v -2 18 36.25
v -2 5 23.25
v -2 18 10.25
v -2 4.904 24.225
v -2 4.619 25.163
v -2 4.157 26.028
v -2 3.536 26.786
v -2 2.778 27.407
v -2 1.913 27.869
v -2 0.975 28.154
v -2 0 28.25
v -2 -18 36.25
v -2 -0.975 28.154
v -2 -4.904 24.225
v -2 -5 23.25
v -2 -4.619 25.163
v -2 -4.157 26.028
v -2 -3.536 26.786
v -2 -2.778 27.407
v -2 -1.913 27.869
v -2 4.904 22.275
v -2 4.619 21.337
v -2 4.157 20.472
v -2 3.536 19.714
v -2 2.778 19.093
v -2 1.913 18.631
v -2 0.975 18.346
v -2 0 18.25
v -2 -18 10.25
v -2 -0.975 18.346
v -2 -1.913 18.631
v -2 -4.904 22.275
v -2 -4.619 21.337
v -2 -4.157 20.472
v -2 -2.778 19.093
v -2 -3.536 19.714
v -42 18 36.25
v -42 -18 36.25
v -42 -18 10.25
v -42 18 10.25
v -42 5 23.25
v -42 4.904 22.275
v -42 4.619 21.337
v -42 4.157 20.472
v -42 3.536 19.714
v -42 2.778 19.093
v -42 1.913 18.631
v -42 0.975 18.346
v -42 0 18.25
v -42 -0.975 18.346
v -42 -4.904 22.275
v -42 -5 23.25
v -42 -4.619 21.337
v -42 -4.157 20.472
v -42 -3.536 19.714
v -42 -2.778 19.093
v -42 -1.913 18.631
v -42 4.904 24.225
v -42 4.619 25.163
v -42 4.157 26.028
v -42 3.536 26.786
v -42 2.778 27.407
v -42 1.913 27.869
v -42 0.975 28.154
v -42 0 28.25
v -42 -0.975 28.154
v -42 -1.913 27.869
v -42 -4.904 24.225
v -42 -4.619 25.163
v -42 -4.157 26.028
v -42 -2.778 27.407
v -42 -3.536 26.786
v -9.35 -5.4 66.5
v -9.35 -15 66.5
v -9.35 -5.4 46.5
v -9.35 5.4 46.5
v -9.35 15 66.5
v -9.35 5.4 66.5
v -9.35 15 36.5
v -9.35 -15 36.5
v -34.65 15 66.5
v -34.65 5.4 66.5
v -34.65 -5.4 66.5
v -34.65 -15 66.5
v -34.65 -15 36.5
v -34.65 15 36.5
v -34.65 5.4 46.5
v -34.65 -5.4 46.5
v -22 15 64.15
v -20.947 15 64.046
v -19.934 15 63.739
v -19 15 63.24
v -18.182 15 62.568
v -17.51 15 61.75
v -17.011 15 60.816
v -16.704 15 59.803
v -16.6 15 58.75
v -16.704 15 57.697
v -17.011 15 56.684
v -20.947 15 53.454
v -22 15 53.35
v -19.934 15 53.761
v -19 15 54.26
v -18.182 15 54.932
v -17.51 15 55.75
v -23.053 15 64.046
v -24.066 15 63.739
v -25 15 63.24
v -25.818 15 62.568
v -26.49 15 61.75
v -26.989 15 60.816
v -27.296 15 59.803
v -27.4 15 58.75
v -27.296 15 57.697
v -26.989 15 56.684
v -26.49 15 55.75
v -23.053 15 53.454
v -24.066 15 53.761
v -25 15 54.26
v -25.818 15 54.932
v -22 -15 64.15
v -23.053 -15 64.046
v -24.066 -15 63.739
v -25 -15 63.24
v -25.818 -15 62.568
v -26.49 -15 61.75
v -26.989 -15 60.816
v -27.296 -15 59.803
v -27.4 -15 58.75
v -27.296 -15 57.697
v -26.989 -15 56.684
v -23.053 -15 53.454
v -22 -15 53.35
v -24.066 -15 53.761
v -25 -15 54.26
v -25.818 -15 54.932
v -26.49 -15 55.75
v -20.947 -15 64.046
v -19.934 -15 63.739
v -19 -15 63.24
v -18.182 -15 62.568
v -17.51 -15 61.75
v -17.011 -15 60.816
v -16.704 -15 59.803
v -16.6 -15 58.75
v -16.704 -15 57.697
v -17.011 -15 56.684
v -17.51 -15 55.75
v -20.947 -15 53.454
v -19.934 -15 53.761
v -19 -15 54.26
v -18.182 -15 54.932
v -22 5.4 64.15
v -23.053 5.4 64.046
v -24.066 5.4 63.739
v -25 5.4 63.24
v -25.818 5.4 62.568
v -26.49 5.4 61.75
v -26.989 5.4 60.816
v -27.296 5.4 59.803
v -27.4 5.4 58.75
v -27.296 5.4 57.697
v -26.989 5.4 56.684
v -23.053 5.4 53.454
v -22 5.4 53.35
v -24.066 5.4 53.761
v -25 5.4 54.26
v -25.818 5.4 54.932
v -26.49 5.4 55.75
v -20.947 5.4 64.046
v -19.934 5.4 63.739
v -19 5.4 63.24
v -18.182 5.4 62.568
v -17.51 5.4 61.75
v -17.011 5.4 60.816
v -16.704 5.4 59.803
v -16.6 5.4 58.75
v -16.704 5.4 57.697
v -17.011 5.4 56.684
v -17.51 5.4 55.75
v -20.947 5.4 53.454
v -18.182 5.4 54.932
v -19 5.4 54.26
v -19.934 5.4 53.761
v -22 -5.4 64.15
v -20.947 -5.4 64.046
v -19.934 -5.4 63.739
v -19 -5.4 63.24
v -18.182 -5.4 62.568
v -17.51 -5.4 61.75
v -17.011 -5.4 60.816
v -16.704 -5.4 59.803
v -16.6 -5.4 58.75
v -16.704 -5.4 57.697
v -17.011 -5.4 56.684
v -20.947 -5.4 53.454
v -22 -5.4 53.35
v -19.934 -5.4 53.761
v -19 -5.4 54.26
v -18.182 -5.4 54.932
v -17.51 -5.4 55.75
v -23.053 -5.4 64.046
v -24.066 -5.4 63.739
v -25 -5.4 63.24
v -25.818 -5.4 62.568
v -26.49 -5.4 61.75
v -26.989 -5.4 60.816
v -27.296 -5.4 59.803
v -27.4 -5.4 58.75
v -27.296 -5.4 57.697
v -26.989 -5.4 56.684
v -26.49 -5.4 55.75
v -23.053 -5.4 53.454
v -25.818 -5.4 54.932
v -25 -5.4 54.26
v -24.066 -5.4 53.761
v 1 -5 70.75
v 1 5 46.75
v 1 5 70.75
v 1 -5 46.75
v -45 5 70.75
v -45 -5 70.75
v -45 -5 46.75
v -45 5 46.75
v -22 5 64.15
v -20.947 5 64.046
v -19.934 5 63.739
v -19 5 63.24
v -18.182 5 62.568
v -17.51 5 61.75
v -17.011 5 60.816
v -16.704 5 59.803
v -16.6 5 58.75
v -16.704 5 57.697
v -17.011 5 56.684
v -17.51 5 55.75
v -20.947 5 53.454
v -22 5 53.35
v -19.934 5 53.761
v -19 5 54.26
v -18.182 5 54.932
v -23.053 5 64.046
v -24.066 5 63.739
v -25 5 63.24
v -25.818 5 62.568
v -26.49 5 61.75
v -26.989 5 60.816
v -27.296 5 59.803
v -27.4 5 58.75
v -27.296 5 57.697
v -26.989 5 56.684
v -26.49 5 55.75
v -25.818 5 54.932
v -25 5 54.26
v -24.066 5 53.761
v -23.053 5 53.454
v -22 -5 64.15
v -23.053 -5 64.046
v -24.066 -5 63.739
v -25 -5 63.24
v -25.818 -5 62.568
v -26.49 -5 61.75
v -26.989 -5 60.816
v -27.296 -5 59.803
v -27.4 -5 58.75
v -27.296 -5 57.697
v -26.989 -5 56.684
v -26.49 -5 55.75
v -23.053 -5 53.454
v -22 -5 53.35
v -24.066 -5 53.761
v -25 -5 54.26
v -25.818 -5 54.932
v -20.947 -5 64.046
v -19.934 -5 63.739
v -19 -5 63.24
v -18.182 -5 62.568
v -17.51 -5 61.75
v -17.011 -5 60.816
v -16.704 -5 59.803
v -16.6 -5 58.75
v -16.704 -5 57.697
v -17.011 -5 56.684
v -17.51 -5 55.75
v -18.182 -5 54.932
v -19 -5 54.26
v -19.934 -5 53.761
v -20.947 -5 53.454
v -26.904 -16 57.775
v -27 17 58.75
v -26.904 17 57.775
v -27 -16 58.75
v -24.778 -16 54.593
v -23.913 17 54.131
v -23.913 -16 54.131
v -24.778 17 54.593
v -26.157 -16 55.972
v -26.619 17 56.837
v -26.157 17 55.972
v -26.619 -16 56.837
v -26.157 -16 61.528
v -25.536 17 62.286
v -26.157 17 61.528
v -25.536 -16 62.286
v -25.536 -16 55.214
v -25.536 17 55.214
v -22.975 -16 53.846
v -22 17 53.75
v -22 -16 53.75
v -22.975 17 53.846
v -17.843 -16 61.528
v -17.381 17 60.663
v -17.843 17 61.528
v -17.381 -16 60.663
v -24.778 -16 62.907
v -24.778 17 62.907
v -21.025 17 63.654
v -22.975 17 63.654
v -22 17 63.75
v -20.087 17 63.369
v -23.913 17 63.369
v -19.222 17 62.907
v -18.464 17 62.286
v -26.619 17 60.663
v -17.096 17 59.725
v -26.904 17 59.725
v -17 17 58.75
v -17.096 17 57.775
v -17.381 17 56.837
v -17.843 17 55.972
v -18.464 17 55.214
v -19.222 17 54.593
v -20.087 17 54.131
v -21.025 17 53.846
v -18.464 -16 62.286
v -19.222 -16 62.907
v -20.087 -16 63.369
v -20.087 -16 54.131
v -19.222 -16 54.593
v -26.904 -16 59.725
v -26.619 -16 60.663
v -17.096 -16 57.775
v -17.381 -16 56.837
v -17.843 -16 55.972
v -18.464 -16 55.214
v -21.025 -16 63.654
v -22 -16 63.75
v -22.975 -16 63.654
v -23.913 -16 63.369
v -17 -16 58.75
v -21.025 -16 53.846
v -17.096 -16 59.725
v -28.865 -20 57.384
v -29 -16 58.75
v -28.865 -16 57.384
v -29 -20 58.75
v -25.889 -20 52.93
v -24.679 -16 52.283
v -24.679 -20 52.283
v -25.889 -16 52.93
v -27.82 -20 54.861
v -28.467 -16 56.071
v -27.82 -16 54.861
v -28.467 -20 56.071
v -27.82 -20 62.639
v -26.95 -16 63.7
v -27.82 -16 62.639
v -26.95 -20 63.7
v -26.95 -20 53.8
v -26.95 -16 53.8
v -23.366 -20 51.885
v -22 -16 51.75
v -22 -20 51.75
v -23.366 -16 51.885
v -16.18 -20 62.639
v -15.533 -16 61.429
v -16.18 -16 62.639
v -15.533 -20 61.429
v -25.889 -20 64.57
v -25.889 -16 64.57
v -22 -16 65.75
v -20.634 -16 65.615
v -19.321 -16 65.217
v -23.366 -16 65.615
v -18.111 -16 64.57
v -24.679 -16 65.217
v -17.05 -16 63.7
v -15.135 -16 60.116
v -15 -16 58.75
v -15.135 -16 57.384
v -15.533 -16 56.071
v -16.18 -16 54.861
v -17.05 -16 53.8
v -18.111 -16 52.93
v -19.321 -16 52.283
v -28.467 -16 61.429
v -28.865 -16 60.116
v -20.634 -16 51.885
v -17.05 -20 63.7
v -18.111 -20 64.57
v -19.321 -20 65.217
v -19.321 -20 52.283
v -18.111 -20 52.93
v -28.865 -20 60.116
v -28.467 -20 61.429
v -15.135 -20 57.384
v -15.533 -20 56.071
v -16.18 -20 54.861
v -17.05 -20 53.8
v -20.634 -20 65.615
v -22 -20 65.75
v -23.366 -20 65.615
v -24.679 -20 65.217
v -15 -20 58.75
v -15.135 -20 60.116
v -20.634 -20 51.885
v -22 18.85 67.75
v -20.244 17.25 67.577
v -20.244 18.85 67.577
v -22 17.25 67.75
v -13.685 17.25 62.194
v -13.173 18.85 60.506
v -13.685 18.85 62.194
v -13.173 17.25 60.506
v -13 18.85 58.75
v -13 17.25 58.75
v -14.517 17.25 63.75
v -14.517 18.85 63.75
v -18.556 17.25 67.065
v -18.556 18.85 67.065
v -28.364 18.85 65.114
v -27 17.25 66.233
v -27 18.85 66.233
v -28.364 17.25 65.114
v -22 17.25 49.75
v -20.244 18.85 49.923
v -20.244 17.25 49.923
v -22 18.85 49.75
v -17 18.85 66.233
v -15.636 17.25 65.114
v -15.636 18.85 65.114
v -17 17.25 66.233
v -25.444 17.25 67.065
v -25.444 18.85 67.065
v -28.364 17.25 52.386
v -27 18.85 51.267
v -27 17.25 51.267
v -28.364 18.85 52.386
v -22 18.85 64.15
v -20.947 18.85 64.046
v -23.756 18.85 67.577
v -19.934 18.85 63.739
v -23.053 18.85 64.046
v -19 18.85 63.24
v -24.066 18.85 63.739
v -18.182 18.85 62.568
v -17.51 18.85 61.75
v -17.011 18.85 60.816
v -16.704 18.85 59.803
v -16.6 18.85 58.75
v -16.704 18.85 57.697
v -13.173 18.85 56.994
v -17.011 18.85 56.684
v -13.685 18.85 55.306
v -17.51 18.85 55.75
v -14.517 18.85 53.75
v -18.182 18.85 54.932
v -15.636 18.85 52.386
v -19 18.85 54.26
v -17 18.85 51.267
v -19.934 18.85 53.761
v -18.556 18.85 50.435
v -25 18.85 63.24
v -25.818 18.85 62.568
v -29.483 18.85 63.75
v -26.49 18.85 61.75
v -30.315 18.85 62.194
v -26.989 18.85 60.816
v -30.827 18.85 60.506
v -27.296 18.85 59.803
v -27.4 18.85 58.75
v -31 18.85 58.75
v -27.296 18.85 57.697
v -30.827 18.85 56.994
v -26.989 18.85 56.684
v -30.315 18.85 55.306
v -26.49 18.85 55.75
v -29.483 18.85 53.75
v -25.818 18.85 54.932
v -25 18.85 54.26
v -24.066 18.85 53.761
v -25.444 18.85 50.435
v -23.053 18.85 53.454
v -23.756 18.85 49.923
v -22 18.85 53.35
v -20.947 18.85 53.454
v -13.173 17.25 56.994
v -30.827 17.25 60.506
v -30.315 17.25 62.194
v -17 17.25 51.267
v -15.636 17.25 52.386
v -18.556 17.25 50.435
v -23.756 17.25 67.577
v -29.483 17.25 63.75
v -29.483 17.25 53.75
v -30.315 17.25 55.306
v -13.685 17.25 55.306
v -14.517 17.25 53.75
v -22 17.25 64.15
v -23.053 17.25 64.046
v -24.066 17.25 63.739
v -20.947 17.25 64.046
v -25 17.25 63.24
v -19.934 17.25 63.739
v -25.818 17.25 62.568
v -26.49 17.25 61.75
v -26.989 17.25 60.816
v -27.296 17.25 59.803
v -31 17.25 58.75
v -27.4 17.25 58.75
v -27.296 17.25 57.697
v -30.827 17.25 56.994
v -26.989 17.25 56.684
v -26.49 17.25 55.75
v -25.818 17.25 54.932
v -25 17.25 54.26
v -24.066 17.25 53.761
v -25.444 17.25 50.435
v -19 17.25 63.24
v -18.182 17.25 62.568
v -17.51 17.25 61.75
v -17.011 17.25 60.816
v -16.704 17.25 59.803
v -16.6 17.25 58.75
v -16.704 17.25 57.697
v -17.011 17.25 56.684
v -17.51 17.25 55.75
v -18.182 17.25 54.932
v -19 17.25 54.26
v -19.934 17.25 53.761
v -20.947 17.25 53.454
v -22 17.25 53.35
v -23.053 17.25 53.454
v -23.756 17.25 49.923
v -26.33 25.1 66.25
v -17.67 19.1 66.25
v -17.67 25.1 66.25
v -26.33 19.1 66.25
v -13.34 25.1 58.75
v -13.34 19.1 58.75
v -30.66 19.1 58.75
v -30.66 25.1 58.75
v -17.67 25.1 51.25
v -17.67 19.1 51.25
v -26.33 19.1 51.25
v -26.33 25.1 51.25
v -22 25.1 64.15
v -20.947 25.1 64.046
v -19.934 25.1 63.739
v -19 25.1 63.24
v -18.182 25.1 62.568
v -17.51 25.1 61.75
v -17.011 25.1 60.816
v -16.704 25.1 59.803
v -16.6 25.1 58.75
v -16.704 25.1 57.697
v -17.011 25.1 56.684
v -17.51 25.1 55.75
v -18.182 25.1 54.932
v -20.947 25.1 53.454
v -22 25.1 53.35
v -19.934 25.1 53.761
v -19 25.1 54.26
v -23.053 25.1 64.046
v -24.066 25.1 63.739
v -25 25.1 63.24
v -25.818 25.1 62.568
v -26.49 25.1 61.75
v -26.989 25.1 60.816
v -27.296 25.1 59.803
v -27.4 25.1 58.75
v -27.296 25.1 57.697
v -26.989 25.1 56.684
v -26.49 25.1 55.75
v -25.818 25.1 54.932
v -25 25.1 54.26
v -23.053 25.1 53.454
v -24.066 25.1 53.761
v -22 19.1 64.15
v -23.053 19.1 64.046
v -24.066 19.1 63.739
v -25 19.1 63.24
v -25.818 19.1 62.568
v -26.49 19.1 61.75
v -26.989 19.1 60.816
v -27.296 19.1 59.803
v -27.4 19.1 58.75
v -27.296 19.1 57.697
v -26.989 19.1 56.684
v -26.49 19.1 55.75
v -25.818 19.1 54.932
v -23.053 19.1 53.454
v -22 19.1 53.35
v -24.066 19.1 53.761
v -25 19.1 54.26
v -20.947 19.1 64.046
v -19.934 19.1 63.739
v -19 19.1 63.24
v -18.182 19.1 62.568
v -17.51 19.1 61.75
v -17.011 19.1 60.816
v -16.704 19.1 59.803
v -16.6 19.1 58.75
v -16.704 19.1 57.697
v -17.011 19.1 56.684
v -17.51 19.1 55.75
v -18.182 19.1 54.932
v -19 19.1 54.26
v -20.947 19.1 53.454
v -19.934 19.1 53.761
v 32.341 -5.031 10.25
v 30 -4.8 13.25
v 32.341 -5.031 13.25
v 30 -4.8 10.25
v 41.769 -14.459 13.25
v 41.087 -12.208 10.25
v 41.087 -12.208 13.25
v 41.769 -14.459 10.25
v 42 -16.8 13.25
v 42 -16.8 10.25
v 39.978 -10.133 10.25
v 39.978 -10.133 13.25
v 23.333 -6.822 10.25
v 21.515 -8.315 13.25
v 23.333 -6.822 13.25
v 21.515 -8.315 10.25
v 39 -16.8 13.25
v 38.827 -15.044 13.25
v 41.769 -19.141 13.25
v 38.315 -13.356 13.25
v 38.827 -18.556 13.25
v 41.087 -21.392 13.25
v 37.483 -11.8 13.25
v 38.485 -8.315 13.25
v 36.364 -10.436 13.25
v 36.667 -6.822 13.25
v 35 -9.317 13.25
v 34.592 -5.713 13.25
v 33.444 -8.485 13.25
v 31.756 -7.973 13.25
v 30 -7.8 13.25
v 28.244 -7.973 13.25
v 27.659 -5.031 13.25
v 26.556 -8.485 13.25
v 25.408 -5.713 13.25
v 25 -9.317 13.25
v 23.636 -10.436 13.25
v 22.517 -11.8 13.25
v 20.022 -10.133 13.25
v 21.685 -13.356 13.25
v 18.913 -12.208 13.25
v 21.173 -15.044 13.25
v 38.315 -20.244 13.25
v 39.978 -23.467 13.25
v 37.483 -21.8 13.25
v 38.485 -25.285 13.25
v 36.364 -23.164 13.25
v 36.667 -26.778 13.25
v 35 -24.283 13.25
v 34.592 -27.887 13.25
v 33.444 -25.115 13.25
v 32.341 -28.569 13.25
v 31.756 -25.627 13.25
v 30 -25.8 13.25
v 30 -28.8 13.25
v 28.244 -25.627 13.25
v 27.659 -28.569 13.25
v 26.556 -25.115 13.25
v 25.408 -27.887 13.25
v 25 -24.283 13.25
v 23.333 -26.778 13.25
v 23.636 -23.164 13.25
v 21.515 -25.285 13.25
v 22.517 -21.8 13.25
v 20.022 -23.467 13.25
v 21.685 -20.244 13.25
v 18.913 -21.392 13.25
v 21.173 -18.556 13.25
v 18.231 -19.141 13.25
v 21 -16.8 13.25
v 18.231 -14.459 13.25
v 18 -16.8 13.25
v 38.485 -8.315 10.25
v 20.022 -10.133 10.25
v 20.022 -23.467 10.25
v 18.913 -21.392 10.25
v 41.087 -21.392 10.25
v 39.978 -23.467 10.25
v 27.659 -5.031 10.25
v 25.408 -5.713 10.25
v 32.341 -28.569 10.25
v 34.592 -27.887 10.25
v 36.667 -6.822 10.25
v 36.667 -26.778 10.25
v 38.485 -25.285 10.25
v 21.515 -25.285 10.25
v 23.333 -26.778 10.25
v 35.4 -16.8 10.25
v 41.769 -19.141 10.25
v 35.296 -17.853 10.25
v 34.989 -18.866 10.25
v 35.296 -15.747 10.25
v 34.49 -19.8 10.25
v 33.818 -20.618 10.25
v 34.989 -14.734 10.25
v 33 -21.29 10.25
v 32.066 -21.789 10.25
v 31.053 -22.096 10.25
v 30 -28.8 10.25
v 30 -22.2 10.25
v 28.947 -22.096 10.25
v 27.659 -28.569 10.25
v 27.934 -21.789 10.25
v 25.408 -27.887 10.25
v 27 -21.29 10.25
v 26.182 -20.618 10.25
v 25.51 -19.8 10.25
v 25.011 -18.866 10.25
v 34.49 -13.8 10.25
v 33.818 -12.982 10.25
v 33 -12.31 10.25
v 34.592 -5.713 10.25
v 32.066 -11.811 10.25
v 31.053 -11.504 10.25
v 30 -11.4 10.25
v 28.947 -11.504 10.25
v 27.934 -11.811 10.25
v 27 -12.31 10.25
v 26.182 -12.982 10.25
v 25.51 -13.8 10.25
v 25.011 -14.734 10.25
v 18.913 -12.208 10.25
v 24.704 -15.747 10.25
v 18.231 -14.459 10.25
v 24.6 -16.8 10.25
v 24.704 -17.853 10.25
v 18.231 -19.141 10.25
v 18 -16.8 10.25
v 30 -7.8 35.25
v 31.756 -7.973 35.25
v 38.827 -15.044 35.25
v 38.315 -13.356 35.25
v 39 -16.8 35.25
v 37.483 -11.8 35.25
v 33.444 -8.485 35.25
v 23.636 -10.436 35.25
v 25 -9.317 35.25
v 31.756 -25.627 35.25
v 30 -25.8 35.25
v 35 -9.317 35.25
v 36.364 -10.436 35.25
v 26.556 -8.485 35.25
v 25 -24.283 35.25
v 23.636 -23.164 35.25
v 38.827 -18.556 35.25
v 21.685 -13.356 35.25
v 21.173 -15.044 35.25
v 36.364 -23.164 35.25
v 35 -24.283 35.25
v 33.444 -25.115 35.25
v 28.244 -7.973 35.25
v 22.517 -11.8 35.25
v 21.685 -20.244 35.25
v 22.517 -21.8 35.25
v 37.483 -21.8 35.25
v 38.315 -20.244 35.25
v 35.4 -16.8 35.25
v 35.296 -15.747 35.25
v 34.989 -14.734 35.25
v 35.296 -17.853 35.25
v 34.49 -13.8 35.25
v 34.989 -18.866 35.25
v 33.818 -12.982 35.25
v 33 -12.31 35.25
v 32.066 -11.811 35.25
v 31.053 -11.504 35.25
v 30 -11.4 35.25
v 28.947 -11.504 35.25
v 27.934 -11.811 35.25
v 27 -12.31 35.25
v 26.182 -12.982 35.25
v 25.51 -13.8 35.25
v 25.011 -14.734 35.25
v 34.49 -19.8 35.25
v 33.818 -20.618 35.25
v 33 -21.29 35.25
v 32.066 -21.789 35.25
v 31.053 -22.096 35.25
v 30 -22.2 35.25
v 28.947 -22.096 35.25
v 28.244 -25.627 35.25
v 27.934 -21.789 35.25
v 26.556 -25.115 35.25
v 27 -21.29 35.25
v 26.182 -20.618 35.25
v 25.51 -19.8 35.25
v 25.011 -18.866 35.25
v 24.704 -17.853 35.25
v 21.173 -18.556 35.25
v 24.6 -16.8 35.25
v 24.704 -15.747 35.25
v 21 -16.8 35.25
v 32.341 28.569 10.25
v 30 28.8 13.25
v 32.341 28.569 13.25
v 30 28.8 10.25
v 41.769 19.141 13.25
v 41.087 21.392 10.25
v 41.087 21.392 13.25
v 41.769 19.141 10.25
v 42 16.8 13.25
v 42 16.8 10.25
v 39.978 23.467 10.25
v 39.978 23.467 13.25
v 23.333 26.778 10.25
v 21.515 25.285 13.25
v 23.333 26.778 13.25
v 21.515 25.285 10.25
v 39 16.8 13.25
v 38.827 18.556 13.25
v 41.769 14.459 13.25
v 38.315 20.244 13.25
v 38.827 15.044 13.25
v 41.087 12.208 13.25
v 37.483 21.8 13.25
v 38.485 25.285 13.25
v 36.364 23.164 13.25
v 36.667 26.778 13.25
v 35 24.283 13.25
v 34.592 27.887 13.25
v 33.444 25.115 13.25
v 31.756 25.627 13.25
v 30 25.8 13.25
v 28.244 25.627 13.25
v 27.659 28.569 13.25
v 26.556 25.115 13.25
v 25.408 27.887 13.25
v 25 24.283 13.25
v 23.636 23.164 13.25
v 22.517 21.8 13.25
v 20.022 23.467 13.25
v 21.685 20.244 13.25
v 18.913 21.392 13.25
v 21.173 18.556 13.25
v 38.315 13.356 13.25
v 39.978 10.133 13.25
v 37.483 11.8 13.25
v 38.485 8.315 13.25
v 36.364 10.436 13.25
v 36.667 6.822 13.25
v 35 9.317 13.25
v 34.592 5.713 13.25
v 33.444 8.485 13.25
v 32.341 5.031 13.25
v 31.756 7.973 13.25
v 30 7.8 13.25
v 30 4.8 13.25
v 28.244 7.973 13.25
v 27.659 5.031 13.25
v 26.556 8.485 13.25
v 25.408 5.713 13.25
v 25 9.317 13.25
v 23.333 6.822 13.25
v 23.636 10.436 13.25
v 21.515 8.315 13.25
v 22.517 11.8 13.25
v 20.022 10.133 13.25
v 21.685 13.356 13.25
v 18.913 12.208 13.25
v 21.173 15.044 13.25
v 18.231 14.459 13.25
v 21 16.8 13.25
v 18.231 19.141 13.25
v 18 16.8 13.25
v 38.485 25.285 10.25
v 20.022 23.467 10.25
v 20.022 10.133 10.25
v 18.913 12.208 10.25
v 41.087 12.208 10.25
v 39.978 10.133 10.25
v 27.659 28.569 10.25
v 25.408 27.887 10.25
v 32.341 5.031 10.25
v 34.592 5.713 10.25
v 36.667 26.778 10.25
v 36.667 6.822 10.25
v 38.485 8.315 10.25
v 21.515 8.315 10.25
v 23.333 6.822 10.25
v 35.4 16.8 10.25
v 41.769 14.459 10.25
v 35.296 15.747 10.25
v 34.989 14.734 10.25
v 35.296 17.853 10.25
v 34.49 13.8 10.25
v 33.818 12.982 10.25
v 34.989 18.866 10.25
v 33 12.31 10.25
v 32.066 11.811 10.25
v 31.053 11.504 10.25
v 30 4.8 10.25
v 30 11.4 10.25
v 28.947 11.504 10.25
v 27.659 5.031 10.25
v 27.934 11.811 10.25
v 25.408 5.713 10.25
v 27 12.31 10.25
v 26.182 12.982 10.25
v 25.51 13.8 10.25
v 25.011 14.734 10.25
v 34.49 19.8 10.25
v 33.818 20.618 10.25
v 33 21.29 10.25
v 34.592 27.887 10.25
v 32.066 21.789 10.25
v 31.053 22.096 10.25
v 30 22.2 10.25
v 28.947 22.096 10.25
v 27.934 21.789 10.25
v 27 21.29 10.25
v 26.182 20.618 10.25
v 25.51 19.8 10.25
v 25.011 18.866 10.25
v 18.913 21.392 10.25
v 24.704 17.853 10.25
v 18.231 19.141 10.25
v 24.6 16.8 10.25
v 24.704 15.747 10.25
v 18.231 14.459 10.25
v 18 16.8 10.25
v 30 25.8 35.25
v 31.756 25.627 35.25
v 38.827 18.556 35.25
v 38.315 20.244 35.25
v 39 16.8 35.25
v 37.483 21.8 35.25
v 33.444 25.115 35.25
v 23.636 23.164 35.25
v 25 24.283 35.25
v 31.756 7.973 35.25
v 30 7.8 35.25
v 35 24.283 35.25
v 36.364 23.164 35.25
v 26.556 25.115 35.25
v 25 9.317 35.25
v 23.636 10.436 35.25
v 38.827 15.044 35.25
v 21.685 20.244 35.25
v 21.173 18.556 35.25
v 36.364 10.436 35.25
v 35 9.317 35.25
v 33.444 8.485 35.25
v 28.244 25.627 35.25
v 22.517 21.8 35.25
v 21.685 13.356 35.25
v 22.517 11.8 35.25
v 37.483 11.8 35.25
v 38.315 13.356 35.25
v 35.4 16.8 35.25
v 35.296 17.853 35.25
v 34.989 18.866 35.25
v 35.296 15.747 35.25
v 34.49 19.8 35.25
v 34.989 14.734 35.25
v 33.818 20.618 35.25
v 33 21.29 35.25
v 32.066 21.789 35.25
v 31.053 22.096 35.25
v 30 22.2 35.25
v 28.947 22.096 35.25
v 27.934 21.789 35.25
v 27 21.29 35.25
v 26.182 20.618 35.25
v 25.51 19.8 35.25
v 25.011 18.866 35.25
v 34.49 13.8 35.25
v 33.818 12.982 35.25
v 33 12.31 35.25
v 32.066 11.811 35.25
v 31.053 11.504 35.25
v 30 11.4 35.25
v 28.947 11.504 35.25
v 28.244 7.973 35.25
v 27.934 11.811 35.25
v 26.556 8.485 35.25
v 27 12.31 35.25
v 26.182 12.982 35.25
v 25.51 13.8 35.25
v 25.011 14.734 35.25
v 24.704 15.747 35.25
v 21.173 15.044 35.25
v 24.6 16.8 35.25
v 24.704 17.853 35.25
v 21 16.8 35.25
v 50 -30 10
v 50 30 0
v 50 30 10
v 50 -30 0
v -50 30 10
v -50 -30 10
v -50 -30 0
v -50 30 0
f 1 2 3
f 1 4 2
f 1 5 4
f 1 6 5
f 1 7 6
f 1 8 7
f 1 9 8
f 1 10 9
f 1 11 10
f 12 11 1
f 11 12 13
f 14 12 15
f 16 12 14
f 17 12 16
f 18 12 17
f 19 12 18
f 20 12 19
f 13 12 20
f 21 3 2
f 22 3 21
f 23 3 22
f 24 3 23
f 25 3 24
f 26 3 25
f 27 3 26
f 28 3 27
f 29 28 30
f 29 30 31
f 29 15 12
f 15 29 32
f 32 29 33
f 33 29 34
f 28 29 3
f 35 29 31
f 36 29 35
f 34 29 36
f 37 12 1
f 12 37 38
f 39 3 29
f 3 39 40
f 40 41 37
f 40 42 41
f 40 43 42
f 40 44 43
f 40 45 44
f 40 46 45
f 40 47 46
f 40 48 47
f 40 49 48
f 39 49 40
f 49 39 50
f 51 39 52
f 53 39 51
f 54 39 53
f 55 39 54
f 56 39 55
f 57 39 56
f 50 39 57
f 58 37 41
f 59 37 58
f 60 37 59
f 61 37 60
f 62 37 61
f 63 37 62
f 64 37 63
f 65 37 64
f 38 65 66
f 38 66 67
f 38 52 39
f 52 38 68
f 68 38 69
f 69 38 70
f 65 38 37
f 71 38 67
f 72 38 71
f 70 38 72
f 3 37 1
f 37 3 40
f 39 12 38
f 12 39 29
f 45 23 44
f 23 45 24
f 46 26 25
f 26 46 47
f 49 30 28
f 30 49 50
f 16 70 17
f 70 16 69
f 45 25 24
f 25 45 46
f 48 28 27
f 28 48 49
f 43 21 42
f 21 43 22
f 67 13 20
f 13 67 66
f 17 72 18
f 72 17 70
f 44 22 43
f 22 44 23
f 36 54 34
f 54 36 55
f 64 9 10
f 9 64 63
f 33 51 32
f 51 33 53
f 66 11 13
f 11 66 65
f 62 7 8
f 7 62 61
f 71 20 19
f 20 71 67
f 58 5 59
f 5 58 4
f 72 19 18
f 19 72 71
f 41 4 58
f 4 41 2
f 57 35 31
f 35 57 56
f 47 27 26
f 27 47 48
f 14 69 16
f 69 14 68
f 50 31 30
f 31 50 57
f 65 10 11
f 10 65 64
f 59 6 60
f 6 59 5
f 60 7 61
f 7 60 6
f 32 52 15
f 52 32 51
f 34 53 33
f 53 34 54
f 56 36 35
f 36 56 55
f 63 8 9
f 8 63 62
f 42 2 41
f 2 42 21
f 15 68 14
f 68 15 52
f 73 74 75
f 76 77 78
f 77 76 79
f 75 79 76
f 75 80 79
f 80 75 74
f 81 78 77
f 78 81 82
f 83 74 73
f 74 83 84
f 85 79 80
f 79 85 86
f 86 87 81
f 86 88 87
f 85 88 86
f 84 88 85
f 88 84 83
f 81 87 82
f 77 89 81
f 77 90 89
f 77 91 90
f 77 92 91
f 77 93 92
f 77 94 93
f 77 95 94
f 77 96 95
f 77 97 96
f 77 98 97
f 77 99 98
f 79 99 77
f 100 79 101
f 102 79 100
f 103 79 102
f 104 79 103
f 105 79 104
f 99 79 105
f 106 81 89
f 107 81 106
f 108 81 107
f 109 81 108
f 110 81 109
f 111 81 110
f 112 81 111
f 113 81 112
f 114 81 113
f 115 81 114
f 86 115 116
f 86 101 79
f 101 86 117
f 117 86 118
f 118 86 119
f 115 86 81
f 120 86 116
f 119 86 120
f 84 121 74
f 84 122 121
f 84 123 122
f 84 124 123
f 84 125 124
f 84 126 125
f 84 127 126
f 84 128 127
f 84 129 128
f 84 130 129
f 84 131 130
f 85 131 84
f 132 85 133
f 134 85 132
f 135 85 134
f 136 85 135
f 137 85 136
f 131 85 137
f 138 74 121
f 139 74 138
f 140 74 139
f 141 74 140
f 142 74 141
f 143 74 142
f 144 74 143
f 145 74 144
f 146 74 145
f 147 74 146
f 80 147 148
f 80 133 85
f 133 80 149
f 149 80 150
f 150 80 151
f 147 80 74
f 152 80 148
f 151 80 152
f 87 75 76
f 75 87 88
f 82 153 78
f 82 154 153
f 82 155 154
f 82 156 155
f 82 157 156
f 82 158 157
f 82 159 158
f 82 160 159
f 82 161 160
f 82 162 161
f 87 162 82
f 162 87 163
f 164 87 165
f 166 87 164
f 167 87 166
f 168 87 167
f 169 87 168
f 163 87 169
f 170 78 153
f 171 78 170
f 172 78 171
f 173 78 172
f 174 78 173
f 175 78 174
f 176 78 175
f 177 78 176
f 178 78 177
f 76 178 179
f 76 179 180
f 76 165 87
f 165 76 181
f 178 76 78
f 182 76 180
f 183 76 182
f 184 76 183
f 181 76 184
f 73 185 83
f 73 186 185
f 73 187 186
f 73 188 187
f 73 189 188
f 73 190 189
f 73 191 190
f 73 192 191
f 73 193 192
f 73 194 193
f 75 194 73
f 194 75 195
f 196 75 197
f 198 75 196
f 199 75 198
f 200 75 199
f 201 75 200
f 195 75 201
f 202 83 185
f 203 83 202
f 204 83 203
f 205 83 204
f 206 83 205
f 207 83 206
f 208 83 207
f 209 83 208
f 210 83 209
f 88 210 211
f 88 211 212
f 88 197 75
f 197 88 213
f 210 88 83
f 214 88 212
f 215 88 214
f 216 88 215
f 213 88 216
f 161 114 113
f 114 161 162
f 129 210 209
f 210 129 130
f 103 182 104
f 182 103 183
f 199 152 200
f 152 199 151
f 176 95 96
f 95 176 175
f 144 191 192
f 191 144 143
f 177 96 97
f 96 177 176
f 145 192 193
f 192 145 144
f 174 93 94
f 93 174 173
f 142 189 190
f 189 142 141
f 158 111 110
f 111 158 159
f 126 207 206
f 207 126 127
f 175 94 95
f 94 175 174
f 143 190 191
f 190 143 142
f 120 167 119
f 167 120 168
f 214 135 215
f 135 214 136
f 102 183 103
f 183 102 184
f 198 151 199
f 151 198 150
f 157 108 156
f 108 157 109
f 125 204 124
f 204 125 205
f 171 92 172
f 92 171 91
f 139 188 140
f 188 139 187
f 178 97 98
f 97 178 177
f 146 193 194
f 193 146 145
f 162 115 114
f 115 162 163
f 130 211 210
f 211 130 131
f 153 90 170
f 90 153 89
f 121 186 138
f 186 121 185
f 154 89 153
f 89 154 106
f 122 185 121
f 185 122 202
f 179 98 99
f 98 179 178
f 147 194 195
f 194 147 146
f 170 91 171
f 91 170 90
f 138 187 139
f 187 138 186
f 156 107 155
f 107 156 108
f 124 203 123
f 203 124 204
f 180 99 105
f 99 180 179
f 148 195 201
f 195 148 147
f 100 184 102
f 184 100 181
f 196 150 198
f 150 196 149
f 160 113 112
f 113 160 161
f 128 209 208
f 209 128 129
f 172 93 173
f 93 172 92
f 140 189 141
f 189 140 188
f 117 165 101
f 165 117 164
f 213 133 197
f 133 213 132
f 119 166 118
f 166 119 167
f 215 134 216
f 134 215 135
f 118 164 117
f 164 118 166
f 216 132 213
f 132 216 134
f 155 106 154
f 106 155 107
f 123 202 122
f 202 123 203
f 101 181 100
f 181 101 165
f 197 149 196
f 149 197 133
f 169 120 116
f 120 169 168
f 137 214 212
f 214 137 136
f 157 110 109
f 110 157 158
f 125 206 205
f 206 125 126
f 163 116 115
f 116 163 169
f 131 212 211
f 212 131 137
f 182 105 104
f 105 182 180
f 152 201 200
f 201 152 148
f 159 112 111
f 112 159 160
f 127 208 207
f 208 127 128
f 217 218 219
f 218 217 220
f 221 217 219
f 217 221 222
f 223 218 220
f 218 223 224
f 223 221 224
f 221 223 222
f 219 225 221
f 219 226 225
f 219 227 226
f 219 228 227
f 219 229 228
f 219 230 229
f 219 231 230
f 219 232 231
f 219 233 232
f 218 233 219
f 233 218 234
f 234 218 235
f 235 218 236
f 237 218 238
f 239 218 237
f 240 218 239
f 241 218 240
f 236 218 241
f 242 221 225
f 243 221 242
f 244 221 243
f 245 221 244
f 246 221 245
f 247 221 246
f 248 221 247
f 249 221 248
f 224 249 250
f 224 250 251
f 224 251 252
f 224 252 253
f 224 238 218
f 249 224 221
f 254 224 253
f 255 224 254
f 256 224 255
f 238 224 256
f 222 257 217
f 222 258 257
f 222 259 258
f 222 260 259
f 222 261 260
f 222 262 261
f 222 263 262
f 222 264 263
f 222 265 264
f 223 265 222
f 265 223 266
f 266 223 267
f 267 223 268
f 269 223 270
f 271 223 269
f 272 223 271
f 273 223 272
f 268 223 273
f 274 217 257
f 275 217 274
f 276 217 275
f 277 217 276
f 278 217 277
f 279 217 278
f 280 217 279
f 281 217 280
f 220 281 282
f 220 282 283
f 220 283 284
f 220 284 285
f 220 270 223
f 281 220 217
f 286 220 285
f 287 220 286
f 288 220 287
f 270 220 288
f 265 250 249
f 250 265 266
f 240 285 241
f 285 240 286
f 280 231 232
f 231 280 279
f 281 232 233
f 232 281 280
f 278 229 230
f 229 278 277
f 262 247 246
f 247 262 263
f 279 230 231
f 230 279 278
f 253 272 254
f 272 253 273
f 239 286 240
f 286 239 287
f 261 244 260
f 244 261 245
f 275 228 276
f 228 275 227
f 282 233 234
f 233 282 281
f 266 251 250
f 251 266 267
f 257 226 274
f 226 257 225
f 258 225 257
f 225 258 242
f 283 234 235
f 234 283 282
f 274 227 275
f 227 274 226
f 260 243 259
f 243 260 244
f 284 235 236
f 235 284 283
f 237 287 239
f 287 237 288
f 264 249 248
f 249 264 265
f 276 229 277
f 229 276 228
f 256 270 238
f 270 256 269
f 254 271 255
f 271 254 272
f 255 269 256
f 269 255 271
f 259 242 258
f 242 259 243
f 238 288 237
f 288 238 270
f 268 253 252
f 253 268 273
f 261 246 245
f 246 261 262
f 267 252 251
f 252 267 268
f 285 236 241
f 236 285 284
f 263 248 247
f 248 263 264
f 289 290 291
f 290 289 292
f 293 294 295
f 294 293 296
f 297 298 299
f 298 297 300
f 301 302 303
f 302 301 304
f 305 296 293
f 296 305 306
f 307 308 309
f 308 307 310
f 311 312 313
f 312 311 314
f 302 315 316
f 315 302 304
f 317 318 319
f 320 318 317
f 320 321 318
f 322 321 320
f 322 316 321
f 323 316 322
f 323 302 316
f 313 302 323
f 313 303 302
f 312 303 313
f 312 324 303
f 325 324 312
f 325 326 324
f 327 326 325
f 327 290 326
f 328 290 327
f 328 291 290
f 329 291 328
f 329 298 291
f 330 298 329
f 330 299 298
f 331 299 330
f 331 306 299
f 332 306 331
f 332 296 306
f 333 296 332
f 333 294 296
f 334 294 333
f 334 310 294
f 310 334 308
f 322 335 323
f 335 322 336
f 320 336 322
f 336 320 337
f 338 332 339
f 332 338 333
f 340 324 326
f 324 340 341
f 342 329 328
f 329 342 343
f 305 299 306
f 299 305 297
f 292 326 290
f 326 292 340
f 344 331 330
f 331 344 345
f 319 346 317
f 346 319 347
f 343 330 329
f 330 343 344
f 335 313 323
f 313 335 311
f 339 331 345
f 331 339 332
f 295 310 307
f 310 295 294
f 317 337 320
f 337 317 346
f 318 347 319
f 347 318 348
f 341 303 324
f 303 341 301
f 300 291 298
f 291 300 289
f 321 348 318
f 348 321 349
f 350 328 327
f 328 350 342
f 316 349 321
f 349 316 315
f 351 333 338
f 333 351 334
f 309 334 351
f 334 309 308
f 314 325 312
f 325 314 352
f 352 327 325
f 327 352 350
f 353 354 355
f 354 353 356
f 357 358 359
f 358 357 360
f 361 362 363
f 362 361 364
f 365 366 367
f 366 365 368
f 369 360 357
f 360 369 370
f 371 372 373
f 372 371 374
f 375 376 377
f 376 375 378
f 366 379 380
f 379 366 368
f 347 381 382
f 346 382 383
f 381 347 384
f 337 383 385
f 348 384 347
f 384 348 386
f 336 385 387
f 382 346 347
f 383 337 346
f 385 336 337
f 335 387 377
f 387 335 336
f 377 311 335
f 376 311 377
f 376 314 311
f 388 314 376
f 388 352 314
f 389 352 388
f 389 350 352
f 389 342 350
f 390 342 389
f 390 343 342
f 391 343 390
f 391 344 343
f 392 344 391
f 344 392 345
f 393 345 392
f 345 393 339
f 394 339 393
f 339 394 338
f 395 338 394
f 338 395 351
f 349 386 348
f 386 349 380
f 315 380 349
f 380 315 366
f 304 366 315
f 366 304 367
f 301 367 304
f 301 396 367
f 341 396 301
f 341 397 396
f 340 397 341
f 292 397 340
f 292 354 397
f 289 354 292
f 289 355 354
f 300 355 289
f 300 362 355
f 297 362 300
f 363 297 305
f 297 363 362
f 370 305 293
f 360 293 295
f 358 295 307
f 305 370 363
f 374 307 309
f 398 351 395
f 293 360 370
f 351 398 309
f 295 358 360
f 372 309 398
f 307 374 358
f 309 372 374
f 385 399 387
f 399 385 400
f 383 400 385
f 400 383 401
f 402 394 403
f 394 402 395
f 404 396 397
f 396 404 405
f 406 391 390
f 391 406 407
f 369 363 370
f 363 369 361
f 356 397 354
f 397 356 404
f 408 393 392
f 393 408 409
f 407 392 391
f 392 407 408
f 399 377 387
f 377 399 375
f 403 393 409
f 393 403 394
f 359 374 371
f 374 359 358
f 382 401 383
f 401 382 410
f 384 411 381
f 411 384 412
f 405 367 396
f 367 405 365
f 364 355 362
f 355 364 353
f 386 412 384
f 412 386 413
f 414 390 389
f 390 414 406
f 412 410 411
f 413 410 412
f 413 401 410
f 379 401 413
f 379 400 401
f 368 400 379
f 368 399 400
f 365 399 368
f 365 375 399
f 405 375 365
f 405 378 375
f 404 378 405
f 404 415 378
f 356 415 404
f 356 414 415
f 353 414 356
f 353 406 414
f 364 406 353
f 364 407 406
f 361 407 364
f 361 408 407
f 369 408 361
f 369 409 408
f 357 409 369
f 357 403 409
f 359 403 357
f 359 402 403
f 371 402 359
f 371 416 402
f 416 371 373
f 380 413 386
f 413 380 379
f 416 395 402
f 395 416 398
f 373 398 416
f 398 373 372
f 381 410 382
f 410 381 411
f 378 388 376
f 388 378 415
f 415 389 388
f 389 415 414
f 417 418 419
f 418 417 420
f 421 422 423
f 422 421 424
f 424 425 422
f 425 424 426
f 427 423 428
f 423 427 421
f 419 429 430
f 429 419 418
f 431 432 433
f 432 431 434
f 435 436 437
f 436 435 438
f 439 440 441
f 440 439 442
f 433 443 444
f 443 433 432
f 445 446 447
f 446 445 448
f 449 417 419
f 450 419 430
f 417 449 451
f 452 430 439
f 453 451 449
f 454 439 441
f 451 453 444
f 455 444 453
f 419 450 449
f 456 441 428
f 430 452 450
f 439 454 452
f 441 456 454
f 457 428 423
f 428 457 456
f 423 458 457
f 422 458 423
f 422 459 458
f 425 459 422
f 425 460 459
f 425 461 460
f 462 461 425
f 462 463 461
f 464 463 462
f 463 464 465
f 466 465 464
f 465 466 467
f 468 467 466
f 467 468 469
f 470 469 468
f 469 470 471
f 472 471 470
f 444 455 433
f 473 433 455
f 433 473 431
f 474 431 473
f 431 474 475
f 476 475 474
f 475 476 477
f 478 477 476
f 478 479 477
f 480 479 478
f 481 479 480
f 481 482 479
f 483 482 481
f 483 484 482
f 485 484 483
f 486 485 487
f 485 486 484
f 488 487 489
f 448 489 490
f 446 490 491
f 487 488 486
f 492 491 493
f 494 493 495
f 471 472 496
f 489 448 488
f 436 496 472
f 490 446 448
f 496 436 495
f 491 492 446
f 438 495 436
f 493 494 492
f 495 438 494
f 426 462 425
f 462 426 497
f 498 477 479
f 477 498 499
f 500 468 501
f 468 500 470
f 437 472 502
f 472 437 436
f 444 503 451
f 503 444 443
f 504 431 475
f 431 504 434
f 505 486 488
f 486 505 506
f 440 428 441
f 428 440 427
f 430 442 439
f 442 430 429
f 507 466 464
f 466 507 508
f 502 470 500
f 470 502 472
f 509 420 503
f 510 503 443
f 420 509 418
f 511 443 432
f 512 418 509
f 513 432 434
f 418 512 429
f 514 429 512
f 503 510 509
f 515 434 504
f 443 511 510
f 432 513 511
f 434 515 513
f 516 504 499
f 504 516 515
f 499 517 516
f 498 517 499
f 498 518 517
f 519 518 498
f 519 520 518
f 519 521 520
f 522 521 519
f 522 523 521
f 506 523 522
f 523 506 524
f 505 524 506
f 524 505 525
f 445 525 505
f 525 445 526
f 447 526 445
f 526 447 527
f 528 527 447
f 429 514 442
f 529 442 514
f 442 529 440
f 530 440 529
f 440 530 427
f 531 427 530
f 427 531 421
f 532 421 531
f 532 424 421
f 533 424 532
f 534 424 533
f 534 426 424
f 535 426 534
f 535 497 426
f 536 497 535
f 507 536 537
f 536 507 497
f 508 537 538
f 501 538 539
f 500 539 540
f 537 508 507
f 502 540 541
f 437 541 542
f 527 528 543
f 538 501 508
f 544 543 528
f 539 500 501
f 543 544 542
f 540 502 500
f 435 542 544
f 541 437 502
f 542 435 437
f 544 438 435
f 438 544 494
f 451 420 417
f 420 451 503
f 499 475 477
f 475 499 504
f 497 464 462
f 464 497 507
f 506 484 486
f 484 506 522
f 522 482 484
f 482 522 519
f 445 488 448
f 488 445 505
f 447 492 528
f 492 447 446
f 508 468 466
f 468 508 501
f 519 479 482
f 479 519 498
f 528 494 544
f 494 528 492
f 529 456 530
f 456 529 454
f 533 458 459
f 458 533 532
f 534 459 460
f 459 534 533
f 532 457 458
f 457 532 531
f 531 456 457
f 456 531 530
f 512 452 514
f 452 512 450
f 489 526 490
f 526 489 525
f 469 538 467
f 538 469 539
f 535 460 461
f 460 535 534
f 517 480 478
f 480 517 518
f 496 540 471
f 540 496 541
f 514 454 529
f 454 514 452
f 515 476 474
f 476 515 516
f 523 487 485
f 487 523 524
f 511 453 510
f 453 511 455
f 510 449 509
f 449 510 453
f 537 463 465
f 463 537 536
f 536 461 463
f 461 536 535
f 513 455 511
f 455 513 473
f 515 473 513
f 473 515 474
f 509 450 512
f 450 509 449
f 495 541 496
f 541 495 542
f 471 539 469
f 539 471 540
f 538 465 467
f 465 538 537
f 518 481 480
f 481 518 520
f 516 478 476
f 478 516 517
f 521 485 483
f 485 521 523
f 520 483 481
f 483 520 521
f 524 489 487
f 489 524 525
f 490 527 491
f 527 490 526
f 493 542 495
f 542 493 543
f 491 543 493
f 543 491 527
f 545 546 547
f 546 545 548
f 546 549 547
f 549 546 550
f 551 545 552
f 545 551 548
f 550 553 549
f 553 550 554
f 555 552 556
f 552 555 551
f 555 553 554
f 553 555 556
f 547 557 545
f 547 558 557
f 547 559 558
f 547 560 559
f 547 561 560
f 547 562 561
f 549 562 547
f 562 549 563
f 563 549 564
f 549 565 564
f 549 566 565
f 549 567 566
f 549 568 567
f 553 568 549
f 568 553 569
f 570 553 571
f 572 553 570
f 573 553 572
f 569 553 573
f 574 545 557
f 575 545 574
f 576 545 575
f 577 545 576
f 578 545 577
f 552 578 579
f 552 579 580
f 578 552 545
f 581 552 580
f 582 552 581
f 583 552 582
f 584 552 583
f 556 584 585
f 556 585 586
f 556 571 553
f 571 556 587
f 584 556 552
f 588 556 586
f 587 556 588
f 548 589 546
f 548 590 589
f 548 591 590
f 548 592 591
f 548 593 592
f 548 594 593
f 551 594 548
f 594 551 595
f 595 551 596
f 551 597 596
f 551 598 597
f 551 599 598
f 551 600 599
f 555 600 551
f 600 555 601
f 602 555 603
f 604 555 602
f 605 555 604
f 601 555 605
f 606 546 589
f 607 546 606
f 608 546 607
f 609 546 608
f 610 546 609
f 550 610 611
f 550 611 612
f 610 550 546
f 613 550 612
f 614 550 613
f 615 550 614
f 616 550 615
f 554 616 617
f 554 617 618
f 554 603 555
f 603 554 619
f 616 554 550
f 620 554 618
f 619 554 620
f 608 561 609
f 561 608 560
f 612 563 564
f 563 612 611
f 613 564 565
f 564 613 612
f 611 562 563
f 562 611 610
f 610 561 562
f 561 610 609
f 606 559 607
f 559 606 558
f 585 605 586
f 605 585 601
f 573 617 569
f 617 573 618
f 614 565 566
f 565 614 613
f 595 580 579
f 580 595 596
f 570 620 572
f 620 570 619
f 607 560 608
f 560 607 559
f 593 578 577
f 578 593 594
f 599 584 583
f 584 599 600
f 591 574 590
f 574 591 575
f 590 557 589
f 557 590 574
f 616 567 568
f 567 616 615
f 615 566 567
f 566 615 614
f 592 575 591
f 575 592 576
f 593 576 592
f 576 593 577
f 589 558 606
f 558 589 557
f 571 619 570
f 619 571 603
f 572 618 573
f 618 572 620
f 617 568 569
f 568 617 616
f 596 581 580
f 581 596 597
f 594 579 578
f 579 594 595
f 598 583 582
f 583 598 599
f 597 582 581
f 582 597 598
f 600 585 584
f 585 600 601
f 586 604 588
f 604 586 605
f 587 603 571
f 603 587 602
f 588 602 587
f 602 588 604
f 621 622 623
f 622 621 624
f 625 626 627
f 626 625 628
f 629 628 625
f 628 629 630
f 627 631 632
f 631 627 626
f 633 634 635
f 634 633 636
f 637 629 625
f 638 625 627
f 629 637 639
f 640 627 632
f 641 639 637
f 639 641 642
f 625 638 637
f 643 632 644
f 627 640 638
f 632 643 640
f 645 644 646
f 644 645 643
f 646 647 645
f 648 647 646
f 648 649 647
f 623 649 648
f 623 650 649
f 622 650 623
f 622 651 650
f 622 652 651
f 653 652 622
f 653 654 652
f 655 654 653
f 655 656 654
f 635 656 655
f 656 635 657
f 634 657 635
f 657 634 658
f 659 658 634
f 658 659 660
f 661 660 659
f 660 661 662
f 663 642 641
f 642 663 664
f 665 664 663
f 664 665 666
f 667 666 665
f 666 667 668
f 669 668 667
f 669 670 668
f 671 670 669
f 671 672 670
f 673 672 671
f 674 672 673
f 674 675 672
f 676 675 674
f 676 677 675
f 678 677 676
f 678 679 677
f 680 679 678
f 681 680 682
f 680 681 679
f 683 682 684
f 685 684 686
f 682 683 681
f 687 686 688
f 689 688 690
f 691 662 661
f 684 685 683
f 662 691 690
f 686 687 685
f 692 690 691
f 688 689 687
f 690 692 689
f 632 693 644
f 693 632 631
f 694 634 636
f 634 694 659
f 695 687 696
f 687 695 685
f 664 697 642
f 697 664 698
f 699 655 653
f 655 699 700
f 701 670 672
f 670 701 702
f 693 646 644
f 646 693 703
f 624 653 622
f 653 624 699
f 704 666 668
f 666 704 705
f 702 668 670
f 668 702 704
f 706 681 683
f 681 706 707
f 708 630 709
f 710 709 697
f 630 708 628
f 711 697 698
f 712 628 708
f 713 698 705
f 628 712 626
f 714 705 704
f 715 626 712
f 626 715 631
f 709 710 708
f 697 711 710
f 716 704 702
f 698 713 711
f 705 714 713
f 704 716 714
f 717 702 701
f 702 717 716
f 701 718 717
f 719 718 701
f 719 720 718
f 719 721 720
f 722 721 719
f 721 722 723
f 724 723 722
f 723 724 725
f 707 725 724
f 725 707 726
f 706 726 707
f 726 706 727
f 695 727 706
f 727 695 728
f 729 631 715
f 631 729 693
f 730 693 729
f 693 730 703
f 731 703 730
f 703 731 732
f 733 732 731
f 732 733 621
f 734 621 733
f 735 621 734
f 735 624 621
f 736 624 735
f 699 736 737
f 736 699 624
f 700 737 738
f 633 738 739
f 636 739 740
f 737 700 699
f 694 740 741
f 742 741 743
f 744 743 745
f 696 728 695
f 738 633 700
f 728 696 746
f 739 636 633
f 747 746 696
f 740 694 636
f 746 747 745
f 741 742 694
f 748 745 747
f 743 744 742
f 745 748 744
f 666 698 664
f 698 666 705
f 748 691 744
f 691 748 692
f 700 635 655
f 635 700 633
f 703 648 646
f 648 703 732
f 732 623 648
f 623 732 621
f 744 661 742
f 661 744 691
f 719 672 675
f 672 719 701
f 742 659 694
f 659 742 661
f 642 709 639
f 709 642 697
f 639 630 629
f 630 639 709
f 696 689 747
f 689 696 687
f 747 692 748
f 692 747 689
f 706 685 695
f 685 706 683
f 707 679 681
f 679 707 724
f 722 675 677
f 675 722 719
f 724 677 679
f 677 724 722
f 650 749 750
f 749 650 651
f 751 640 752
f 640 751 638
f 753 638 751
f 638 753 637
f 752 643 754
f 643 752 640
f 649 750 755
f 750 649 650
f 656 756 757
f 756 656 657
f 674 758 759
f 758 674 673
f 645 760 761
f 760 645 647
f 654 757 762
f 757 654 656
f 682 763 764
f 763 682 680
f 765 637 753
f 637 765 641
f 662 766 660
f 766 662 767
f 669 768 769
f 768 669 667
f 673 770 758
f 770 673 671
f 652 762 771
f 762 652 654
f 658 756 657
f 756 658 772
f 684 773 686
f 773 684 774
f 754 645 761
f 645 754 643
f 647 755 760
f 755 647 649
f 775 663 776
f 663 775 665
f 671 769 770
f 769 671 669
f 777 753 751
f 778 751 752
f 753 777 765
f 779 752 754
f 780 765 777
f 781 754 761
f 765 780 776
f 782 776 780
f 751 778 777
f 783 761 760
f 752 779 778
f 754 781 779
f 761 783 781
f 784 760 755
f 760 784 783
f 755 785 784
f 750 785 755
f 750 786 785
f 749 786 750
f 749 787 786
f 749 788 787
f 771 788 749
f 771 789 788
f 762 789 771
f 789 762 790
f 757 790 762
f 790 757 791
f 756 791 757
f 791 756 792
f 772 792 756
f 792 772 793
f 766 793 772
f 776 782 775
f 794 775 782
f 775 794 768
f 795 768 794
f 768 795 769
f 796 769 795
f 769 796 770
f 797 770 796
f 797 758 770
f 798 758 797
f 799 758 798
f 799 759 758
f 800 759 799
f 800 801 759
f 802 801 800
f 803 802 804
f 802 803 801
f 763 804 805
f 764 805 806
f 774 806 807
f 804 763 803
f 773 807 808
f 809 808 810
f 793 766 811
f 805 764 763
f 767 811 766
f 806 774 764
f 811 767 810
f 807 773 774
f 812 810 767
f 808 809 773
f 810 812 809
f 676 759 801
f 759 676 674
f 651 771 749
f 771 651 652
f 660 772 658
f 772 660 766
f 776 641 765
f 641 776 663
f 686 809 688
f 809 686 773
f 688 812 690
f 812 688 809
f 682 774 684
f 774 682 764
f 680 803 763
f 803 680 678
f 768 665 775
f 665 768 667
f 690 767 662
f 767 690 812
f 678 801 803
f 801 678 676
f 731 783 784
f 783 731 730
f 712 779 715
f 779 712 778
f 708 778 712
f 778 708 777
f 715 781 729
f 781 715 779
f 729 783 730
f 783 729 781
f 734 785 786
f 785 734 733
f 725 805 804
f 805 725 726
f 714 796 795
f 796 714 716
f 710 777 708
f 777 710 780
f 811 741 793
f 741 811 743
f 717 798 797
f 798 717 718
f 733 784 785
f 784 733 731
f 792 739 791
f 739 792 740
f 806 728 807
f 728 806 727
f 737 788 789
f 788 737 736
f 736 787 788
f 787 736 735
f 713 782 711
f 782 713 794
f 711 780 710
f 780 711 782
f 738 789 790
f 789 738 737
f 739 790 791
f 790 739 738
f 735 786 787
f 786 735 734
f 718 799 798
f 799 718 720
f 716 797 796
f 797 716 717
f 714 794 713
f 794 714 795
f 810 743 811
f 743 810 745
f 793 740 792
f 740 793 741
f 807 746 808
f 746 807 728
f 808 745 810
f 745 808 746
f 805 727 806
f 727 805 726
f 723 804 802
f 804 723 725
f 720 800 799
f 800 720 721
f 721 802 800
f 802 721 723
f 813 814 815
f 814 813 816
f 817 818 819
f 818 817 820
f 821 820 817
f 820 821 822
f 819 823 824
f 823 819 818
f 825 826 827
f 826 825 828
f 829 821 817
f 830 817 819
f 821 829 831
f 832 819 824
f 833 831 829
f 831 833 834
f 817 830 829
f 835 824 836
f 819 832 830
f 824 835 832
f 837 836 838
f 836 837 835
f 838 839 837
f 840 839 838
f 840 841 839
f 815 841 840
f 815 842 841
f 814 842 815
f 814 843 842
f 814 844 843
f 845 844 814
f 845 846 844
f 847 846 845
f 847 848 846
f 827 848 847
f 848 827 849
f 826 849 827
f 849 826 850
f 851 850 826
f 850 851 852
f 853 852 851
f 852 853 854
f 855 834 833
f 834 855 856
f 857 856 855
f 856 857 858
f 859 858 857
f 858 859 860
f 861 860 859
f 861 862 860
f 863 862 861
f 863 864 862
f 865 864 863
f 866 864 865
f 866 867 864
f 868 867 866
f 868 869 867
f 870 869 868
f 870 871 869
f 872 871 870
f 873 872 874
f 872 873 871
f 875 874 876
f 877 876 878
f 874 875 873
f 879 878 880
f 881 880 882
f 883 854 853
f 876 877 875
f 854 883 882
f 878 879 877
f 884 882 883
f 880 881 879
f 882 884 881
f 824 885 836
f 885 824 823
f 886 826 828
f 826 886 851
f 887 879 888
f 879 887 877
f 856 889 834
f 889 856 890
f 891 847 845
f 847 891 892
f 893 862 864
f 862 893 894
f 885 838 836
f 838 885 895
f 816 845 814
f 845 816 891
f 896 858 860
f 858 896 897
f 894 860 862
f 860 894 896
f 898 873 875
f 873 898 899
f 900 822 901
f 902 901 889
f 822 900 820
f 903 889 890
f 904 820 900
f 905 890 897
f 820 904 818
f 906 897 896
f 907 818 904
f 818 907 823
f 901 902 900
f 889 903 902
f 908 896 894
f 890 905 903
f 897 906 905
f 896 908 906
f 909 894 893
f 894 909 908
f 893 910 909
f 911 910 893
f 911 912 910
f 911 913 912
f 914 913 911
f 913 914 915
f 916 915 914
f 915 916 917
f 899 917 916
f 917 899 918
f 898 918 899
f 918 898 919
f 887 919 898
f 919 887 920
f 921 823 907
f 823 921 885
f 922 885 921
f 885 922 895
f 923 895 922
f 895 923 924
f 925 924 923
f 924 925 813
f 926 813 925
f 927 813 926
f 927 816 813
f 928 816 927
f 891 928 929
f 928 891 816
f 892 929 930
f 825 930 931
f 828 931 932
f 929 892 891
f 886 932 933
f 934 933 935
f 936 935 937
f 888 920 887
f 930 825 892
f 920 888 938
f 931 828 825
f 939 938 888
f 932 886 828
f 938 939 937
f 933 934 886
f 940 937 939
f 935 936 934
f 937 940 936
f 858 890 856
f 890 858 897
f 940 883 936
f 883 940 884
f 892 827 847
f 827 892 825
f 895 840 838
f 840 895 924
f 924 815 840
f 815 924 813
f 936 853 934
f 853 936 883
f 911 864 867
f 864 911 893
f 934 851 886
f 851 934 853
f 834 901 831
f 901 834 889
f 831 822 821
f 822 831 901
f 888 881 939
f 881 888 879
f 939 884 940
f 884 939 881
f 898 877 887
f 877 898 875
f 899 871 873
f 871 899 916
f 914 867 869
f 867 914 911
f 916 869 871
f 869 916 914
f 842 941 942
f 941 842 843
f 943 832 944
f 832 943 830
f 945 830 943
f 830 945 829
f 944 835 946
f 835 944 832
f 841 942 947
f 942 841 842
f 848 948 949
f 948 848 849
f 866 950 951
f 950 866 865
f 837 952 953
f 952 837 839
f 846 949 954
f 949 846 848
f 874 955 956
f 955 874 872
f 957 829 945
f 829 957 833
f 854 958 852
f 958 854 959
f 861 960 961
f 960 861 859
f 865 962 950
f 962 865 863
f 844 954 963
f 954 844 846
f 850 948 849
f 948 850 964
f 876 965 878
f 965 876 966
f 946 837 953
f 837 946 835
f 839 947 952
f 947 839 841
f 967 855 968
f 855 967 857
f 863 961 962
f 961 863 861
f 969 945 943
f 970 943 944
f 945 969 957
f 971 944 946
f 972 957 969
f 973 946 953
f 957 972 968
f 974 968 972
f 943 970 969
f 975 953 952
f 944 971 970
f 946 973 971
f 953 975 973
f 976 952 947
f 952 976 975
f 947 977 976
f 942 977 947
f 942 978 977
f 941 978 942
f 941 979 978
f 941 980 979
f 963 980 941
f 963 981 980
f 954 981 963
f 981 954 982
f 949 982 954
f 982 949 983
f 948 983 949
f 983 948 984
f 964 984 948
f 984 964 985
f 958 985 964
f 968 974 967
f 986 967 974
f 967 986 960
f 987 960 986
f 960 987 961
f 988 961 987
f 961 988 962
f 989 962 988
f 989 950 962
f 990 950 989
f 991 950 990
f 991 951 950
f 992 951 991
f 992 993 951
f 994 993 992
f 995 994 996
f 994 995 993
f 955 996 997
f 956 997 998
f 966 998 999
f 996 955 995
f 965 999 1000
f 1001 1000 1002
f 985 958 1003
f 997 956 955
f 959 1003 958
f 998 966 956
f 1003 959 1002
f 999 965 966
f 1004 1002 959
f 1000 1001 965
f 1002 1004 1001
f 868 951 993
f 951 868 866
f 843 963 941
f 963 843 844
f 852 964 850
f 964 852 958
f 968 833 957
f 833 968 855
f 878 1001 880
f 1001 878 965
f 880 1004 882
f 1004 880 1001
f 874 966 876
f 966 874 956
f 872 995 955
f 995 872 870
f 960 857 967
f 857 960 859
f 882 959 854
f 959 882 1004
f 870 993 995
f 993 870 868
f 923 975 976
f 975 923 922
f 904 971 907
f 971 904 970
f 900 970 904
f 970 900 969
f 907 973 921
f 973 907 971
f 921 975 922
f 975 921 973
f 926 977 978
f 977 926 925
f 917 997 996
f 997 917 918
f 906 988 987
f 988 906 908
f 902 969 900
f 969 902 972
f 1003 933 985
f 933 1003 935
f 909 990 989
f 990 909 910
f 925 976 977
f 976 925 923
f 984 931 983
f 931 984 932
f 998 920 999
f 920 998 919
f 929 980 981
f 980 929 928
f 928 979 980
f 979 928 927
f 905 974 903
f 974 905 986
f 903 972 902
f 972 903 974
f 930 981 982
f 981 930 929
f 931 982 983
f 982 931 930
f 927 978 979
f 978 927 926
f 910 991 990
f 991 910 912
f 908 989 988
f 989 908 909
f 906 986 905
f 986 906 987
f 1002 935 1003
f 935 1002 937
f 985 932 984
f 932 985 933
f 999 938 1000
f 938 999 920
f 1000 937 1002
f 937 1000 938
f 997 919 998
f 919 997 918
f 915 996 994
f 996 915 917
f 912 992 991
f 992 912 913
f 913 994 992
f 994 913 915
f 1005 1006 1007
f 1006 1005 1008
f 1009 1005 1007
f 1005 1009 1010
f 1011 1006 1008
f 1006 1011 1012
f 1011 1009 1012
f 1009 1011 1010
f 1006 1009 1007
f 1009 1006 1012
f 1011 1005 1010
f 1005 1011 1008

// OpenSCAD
$fn = 32;

// ------------------------------------------------------------------------
// Indexing jig: plate 100 x 60 mm, pin d10
// Every part is its own module, assembly() places every instance.
// ------------------------------------------------------------------------

// --- part 1 ---
module jig_plate() {
  difference() {
    translate([-50, -30, 0]) cube([100, 60, 10]);
  }
}

// --- part 2 ---
module locator_block() {
  difference() {
    translate([-20, -18, 0]) cube([40, 36, 26]);
    translate([0, 0, 13]) rotate([0, 90, 0]) cylinder(h = 42, d = 10, center = true);
  }
}

// --- part 3 ---
module index_fork() {
  difference() {
    translate([-12.65, -15, 0]) cube([25.3, 30, 30]);
    translate([-13.65, -5.4, 10]) cube([27.3, 10.8, 21]);
    translate([0, 0, 22.25]) rotate([90, 0, 0]) cylinder(h = 32, d = 10.8, center = true);
  }
}

// --- part 4 ---
module index_arm() {
  difference() {
    translate([-23, -5, 0]) cube([46, 10, 24]);
    translate([0, 0, 12]) rotate([90, 0, 0]) cylinder(h = 12, d = 10.8, center = true);
  }
}

// --- part 5 ---
module index_pin() {
  rotate([0, 90, 0]) cylinder(h = 34, d = 10, center = true);
  translate([-20, 0, 0]) rotate([0, 90, 0]) cylinder(h = 4, d = 14);
}

// --- part 6 ---
module pin_washer() {
  difference() {
      translate([0, 0, 0]) cylinder(h = 1.6, d = 18);
      translate([0, 0, -1]) cylinder(h = 3.6, d = 10.8);
    }
}

// --- part 7 ---
module lock_nut() {
  difference() {
    linear_extrude(height = 6) polygon(points = [[8.66, 0], [4.33, 7.5], [-4.33, 7.5], [-8.66, 0], [-4.33, -7.5], [4.33, -7.5]]);
    translate([0, 0, -1]) cylinder(h = 8, d = 10.8);
  }
}

// --- part 8 ---
module guide_bush_a() {
  difference() {
    union() {
      cylinder(h = 3, d = 24);
      translate([0, 0, 3]) cylinder(h = 22, d = 18);
    }
    translate([0, 0, -1]) cylinder(h = 27, d = 10.8);
  }
}

// --- part 9 ---
module guide_bush_b() {
  difference() {
    union() {
      cylinder(h = 3, d = 24);
      translate([0, 0, 3]) cylinder(h = 22, d = 18);
    }
    translate([0, 0, -1]) cylinder(h = 27, d = 10.8);
  }
}

// --- assembly ---
module assembly() {
  color([0.80, 0.24, 0.20]) translate([0, 0, 0]) rotate([0, 0, 0]) jig_plate();
  color([0.20, 0.45, 0.75]) translate([-22, 0, 10.25]) rotate([0, 0, 0]) locator_block();
  color([0.25, 0.62, 0.32]) translate([-22, 0, 36.5]) rotate([0, 0, 0]) index_fork();
  color([0.92, 0.70, 0.18]) translate([-22, 0, 46.75]) rotate([0, 0, 0]) index_arm();
  color([0.58, 0.35, 0.70]) translate([-22, 0, 58.75]) rotate([0, 0, 90]) index_pin();
  color([0.16, 0.66, 0.66]) translate([-22, 18.85, 58.75]) rotate([90, 0, 0]) pin_washer();
  color([0.85, 0.48, 0.18]) translate([-22, 25.1, 58.75]) rotate([90, 0, 0]) lock_nut();
  color([0.55, 0.60, 0.65]) translate([30, -16.8, 10.25]) rotate([0, 0, 0]) guide_bush_a();
  color([0.75, 0.30, 0.55]) translate([30, 16.8, 10.25]) rotate([0, 0, 0]) guide_bush_b();
}

assembly();
